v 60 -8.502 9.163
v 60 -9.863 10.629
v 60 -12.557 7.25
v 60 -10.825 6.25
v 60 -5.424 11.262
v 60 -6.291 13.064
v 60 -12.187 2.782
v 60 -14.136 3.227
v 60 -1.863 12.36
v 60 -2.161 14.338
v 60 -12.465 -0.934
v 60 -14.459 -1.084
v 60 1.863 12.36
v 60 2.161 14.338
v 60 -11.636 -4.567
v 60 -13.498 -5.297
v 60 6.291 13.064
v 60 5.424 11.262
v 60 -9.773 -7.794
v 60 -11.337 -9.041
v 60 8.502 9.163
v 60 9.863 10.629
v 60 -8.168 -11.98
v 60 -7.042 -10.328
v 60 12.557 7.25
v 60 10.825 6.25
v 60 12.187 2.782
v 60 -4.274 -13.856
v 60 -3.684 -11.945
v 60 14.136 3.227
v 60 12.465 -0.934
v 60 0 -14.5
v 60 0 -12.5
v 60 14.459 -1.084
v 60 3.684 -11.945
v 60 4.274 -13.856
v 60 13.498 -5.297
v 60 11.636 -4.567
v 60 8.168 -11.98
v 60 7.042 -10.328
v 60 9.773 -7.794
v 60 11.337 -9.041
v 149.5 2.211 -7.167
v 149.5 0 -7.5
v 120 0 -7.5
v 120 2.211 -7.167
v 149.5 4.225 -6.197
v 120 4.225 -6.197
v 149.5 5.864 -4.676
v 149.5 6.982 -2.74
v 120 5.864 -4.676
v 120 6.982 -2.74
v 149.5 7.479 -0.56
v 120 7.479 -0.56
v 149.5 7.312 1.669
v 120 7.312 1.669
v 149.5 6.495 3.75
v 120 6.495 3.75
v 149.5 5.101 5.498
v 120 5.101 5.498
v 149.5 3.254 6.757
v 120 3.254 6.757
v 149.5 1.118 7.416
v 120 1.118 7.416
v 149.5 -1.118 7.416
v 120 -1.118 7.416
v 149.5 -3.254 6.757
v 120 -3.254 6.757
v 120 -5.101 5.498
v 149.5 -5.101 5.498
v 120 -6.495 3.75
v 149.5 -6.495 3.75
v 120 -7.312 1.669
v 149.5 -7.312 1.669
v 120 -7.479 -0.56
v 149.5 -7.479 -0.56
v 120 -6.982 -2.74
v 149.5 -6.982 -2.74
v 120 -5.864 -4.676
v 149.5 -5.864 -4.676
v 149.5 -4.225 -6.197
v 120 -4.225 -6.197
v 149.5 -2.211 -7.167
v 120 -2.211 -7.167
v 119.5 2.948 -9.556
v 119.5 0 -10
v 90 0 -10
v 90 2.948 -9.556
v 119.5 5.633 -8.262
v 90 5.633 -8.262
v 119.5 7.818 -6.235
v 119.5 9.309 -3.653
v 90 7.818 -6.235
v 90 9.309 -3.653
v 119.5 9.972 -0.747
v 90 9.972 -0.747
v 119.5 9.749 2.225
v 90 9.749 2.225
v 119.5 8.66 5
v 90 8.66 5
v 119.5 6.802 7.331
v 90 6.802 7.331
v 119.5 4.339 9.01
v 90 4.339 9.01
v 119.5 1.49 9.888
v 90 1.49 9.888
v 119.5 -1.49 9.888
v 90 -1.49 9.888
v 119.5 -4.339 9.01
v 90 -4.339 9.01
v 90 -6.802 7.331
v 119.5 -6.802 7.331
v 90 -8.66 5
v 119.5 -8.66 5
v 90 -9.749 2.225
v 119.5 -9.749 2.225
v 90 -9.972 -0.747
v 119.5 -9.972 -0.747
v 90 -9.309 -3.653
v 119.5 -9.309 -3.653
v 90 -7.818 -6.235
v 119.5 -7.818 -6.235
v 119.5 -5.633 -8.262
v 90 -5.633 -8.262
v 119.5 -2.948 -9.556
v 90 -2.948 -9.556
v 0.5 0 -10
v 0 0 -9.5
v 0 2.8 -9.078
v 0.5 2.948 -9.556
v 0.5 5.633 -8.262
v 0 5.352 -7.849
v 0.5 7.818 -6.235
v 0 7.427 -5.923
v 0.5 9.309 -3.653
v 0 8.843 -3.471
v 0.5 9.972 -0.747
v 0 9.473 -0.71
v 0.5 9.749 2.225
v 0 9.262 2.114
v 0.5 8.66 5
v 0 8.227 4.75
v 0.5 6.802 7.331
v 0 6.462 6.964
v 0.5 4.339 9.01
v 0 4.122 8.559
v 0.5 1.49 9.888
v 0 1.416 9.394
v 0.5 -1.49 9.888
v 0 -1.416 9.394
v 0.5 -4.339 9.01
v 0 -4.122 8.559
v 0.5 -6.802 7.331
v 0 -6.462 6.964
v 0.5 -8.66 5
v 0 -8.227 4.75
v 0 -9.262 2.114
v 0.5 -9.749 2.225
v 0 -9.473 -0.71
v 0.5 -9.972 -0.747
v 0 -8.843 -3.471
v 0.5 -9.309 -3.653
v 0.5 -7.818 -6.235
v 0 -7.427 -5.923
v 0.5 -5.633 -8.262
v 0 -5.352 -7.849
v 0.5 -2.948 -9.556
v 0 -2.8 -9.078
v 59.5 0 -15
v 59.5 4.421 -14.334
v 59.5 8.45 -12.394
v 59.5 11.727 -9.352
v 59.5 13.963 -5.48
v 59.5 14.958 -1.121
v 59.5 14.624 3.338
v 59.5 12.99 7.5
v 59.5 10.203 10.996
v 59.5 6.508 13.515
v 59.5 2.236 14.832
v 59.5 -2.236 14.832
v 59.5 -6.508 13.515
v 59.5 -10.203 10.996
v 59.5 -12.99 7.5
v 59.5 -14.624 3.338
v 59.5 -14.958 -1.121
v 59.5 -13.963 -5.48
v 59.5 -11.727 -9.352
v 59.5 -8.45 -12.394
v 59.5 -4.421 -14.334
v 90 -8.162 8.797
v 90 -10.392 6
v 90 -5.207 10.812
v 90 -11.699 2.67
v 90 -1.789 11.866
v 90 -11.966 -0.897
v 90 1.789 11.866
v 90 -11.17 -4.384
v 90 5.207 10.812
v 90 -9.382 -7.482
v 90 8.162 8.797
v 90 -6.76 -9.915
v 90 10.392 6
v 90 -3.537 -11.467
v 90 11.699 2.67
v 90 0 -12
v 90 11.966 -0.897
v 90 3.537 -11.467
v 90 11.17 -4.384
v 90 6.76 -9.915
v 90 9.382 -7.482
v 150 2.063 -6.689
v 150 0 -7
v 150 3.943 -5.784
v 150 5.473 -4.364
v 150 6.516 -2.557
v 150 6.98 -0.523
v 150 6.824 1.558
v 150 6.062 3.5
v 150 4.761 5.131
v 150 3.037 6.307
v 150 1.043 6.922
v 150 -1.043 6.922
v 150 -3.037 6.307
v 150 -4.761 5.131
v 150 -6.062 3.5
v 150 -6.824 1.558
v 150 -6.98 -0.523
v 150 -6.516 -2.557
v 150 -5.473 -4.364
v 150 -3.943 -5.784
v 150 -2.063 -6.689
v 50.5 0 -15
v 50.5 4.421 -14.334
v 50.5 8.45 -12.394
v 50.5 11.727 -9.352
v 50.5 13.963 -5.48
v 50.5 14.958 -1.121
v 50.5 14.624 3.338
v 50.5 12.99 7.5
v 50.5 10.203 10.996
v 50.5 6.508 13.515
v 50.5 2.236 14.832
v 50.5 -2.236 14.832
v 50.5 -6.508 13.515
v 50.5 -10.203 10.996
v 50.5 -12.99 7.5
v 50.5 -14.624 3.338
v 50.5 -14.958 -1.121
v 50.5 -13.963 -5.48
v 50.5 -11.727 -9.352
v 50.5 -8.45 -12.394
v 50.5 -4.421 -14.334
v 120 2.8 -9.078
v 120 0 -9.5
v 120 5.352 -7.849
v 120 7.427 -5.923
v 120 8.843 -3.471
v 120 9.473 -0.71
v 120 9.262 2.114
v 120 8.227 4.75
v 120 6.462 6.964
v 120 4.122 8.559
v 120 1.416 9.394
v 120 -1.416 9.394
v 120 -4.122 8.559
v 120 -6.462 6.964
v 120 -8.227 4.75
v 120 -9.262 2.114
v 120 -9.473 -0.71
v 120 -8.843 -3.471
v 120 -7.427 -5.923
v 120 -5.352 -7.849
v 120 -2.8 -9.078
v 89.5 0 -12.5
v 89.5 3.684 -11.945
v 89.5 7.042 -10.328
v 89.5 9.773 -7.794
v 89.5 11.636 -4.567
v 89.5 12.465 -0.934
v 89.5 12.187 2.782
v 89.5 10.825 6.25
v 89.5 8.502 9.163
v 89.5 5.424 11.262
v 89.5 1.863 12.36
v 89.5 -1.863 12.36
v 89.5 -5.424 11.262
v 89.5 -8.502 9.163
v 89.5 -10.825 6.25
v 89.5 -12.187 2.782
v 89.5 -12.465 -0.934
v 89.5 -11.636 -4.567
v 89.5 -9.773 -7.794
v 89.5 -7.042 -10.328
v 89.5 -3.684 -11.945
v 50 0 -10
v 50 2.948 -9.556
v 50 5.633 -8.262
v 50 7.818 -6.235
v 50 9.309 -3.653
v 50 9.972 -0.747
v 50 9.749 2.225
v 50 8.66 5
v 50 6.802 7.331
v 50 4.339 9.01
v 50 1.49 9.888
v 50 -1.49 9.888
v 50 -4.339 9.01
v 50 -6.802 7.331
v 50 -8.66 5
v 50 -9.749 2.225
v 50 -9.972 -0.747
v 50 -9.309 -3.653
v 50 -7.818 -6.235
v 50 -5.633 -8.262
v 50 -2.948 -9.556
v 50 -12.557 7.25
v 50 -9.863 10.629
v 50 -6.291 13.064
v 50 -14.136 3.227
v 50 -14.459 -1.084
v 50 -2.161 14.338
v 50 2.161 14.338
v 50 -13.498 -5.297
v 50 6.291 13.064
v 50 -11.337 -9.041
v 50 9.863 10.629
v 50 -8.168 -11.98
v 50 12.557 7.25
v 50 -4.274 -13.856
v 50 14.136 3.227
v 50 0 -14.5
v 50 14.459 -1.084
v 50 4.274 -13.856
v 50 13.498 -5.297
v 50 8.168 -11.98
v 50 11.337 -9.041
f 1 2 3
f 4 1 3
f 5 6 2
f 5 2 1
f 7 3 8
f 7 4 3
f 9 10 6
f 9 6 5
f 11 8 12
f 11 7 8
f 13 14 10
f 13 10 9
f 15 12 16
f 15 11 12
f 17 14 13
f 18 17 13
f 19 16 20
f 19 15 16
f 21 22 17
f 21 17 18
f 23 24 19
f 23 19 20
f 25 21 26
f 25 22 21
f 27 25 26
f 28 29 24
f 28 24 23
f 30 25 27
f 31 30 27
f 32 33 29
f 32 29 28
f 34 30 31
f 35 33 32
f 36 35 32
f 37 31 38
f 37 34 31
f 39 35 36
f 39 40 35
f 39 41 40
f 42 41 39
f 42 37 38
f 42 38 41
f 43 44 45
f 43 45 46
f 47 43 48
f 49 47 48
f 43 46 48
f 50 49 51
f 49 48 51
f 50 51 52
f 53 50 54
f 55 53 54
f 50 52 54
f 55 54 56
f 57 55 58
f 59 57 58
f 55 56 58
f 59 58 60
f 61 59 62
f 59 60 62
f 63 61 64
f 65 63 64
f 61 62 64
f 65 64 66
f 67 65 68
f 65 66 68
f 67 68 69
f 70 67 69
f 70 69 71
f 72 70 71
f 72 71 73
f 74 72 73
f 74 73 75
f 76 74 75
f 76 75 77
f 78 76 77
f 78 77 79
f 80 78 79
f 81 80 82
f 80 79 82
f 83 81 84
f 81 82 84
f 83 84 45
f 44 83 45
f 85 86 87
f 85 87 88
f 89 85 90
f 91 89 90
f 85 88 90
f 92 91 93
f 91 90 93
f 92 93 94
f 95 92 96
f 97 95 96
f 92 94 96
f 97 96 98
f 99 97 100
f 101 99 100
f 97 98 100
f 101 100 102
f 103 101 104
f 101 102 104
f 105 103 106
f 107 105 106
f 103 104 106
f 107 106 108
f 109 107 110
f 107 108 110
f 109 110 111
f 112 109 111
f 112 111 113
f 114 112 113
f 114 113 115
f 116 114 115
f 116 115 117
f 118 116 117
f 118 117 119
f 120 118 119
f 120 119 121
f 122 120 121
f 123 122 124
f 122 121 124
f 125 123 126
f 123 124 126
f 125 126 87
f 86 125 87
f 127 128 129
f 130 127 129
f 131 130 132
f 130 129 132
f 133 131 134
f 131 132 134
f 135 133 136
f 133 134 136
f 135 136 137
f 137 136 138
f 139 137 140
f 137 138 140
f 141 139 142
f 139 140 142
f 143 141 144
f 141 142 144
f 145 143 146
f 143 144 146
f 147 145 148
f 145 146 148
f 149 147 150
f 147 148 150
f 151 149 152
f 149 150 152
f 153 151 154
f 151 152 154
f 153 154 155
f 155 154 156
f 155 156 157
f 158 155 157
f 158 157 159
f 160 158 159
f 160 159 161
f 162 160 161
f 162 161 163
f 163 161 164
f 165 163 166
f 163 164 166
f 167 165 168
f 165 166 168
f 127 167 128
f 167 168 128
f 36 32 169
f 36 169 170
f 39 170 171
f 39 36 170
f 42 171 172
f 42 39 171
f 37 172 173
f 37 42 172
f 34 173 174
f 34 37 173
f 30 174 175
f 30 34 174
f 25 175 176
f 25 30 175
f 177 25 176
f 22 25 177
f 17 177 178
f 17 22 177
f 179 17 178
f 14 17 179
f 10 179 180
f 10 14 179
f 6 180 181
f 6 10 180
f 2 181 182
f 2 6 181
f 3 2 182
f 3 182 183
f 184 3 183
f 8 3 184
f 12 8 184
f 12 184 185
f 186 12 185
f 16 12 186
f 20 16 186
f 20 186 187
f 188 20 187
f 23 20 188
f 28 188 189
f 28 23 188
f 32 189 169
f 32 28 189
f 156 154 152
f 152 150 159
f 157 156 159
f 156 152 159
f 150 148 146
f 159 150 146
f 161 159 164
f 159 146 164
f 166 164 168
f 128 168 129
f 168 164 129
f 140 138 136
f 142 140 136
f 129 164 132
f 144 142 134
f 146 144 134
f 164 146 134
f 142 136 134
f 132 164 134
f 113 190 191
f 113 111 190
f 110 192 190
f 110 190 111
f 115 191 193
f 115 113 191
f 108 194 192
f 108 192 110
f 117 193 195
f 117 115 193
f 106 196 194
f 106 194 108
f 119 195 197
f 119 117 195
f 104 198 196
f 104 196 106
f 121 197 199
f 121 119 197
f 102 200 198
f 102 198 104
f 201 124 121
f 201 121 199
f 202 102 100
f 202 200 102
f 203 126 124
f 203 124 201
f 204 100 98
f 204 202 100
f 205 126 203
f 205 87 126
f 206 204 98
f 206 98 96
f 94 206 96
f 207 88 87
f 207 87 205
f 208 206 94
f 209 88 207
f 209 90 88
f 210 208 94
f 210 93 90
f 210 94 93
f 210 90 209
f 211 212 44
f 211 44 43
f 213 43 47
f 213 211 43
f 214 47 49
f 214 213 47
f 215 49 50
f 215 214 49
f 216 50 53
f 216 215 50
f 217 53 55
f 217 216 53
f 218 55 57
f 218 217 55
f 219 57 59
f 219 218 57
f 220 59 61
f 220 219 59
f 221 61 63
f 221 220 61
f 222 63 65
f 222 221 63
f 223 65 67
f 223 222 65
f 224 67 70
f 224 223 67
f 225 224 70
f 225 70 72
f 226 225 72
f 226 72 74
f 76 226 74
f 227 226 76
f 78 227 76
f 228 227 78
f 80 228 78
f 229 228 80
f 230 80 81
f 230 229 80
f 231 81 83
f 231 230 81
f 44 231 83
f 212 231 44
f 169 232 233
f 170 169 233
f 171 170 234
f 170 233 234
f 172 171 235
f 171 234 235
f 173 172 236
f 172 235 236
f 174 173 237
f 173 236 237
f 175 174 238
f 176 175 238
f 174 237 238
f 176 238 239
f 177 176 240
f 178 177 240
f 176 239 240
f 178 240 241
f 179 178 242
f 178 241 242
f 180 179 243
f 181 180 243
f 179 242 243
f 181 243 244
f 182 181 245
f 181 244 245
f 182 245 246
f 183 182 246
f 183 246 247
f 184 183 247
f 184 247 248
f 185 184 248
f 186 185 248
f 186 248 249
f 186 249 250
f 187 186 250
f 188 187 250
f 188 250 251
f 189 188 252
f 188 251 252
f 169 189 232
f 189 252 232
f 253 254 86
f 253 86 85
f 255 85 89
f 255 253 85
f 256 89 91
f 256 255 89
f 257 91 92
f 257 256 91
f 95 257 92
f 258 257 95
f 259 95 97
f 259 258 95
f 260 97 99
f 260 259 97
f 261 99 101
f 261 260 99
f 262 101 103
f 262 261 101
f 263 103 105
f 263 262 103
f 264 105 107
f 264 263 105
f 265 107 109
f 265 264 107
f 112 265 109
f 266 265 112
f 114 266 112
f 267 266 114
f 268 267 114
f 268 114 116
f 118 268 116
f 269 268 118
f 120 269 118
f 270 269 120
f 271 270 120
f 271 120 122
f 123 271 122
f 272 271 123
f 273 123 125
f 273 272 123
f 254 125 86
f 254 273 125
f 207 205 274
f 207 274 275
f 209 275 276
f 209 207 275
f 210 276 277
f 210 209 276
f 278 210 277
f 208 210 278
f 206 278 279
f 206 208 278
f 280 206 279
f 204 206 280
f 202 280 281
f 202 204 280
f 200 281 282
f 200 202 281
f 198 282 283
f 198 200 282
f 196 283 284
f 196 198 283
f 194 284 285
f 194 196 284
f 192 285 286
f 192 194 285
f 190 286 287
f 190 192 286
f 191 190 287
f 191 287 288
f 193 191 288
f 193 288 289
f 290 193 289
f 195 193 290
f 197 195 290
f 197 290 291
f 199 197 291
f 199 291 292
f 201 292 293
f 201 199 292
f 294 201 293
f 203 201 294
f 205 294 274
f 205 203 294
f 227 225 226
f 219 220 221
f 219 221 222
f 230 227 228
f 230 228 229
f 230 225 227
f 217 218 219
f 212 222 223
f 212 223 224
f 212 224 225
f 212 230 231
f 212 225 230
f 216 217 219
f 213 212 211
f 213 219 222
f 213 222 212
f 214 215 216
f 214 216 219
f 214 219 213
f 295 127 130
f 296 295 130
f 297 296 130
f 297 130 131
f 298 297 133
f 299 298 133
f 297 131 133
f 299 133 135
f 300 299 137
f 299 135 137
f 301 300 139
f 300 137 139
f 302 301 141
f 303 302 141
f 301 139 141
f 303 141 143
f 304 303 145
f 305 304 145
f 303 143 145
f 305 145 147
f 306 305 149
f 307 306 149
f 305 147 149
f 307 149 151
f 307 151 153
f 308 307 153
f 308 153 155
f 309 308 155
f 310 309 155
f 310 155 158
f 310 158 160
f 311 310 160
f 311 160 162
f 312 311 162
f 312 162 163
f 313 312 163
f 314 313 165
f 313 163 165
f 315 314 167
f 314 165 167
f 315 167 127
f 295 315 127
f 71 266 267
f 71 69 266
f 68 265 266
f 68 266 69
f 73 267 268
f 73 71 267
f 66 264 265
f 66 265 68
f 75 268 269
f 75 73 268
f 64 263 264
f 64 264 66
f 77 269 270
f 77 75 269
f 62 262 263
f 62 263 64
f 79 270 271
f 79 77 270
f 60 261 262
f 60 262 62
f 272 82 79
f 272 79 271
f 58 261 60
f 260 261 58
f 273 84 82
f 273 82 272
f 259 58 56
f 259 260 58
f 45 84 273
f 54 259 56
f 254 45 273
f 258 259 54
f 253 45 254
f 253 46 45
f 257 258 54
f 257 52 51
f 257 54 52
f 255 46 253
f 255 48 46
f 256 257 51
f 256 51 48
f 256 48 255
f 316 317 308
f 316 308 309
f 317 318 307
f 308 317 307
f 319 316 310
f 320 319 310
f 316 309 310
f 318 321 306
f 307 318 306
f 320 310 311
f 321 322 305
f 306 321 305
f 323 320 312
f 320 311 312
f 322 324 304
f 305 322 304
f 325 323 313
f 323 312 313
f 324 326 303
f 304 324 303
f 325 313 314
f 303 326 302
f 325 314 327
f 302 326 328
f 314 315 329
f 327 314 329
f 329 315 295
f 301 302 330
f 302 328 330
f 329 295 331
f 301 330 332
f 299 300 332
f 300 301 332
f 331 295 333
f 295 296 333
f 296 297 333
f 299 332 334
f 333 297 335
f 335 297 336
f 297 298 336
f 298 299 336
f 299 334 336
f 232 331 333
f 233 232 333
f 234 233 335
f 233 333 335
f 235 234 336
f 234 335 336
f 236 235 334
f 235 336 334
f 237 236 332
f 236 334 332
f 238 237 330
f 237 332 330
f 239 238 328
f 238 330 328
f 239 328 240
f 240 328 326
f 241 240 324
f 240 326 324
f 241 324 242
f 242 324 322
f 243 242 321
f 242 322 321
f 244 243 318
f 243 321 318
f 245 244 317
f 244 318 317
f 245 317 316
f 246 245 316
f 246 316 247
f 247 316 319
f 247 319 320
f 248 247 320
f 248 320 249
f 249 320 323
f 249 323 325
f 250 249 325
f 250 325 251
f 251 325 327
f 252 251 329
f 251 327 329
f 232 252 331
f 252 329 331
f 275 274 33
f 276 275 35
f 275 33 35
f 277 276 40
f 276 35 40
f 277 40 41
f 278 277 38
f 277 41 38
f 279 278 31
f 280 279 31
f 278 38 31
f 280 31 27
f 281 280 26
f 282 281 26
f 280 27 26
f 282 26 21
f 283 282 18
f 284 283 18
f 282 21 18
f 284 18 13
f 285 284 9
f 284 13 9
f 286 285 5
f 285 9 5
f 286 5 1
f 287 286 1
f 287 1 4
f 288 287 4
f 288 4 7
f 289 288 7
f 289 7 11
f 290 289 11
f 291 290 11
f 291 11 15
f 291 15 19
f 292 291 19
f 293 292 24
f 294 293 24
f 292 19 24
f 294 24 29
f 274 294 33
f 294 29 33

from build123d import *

# Parameters (mm, degrees)
SKETCH_1_R      = 10
EXTRUDE_1_DEPTH = 50
CHAMFER_1_SIZE  = 0.5
SKETCH_2_R      = 15
EXTRUDE_2_DEPTH = 10
CHAMFER_2_SIZE  = 0.5
CHAMFER_3_SIZE  = 0.5
SKETCH_3_R      = 12.5
EXTRUDE_3_DEPTH = 30
CHAMFER_4_SIZE  = 0.5
SKETCH_4_R      = 10
EXTRUDE_4_DEPTH = 30
CHAMFER_5_SIZE  = 0.5
SKETCH_5_R      = 7.5
EXTRUDE_5_DEPTH = 30
CHAMFER_6_SIZE  = 0.5


with BuildPart() as part:
    # 草图1 → 凸台-拉伸1 (new body)
    with BuildSketch(Plane(origin=(0, 0, 0), x_dir=(0, 0, -1), z_dir=(1, 0, 0))):
        Circle(SKETCH_1_R)
    extrude(amount=EXTRUDE_1_DEPTH)

    # 倒角1
    chamfer_1_edges = [part.edges().sort_by_distance(p)[0] for p in [
        (0, 0, 10),
    ]]
    chamfer(chamfer_1_edges, length=CHAMFER_1_SIZE)

    # 草图2 → 凸台-拉伸2 (add)
    with BuildSketch(Plane(origin=(50, 0, 0), x_dir=(0, 0, -1), z_dir=(1, 0, 0))):
        Circle(SKETCH_2_R)
    extrude(amount=EXTRUDE_2_DEPTH)

    # 倒角2
    chamfer_2_edges = [part.edges().sort_by_distance(p)[0] for p in [
        (50, 0, 15),
    ]]
    chamfer(chamfer_2_edges, length=CHAMFER_2_SIZE)

    # 倒角3
    chamfer_3_edges = [part.edges().sort_by_distance(p)[0] for p in [
        (60, 0, 15),
    ]]
    chamfer(chamfer_3_edges, length=CHAMFER_3_SIZE)

    # 草图3 → 凸台-拉伸3 (add)
    with BuildSketch(Plane(origin=(60, 0, 0), x_dir=(0, 0, -1), z_dir=(1, 0, 0))):
        Circle(SKETCH_3_R)
    extrude(amount=EXTRUDE_3_DEPTH)

    # 倒角4
    chamfer_4_edges = [part.edges().sort_by_distance(p)[0] for p in [
        (90, 0, 12.5),
    ]]
    chamfer(chamfer_4_edges, length=CHAMFER_4_SIZE)

    # 草图4 → 凸台-拉伸4 (add)
    with BuildSketch(Plane(origin=(90, 0, 0), x_dir=(0, 0, -1), z_dir=(1, 0, 0))):
        Circle(SKETCH_4_R)
    extrude(amount=EXTRUDE_4_DEPTH)

    # 倒角5
    chamfer_5_edges = [part.edges().sort_by_distance(p)[0] for p in [
        (120, 0, 10),
    ]]
    chamfer(chamfer_5_edges, length=CHAMFER_5_SIZE)

    # 草图5 → 凸台-拉伸5 (add)
    with BuildSketch(Plane(origin=(120, 0, 0), x_dir=(0, 0, -1), z_dir=(1, 0, 0))):
        Circle(SKETCH_5_R)
    extrude(amount=EXTRUDE_5_DEPTH)

    # 倒角6
    chamfer_6_edges = [part.edges().sort_by_distance(p)[0] for p in [
        (150, 0, 7.5),
    ]]
    chamfer(chamfer_6_edges, length=CHAMFER_6_SIZE)


solid = part.part
